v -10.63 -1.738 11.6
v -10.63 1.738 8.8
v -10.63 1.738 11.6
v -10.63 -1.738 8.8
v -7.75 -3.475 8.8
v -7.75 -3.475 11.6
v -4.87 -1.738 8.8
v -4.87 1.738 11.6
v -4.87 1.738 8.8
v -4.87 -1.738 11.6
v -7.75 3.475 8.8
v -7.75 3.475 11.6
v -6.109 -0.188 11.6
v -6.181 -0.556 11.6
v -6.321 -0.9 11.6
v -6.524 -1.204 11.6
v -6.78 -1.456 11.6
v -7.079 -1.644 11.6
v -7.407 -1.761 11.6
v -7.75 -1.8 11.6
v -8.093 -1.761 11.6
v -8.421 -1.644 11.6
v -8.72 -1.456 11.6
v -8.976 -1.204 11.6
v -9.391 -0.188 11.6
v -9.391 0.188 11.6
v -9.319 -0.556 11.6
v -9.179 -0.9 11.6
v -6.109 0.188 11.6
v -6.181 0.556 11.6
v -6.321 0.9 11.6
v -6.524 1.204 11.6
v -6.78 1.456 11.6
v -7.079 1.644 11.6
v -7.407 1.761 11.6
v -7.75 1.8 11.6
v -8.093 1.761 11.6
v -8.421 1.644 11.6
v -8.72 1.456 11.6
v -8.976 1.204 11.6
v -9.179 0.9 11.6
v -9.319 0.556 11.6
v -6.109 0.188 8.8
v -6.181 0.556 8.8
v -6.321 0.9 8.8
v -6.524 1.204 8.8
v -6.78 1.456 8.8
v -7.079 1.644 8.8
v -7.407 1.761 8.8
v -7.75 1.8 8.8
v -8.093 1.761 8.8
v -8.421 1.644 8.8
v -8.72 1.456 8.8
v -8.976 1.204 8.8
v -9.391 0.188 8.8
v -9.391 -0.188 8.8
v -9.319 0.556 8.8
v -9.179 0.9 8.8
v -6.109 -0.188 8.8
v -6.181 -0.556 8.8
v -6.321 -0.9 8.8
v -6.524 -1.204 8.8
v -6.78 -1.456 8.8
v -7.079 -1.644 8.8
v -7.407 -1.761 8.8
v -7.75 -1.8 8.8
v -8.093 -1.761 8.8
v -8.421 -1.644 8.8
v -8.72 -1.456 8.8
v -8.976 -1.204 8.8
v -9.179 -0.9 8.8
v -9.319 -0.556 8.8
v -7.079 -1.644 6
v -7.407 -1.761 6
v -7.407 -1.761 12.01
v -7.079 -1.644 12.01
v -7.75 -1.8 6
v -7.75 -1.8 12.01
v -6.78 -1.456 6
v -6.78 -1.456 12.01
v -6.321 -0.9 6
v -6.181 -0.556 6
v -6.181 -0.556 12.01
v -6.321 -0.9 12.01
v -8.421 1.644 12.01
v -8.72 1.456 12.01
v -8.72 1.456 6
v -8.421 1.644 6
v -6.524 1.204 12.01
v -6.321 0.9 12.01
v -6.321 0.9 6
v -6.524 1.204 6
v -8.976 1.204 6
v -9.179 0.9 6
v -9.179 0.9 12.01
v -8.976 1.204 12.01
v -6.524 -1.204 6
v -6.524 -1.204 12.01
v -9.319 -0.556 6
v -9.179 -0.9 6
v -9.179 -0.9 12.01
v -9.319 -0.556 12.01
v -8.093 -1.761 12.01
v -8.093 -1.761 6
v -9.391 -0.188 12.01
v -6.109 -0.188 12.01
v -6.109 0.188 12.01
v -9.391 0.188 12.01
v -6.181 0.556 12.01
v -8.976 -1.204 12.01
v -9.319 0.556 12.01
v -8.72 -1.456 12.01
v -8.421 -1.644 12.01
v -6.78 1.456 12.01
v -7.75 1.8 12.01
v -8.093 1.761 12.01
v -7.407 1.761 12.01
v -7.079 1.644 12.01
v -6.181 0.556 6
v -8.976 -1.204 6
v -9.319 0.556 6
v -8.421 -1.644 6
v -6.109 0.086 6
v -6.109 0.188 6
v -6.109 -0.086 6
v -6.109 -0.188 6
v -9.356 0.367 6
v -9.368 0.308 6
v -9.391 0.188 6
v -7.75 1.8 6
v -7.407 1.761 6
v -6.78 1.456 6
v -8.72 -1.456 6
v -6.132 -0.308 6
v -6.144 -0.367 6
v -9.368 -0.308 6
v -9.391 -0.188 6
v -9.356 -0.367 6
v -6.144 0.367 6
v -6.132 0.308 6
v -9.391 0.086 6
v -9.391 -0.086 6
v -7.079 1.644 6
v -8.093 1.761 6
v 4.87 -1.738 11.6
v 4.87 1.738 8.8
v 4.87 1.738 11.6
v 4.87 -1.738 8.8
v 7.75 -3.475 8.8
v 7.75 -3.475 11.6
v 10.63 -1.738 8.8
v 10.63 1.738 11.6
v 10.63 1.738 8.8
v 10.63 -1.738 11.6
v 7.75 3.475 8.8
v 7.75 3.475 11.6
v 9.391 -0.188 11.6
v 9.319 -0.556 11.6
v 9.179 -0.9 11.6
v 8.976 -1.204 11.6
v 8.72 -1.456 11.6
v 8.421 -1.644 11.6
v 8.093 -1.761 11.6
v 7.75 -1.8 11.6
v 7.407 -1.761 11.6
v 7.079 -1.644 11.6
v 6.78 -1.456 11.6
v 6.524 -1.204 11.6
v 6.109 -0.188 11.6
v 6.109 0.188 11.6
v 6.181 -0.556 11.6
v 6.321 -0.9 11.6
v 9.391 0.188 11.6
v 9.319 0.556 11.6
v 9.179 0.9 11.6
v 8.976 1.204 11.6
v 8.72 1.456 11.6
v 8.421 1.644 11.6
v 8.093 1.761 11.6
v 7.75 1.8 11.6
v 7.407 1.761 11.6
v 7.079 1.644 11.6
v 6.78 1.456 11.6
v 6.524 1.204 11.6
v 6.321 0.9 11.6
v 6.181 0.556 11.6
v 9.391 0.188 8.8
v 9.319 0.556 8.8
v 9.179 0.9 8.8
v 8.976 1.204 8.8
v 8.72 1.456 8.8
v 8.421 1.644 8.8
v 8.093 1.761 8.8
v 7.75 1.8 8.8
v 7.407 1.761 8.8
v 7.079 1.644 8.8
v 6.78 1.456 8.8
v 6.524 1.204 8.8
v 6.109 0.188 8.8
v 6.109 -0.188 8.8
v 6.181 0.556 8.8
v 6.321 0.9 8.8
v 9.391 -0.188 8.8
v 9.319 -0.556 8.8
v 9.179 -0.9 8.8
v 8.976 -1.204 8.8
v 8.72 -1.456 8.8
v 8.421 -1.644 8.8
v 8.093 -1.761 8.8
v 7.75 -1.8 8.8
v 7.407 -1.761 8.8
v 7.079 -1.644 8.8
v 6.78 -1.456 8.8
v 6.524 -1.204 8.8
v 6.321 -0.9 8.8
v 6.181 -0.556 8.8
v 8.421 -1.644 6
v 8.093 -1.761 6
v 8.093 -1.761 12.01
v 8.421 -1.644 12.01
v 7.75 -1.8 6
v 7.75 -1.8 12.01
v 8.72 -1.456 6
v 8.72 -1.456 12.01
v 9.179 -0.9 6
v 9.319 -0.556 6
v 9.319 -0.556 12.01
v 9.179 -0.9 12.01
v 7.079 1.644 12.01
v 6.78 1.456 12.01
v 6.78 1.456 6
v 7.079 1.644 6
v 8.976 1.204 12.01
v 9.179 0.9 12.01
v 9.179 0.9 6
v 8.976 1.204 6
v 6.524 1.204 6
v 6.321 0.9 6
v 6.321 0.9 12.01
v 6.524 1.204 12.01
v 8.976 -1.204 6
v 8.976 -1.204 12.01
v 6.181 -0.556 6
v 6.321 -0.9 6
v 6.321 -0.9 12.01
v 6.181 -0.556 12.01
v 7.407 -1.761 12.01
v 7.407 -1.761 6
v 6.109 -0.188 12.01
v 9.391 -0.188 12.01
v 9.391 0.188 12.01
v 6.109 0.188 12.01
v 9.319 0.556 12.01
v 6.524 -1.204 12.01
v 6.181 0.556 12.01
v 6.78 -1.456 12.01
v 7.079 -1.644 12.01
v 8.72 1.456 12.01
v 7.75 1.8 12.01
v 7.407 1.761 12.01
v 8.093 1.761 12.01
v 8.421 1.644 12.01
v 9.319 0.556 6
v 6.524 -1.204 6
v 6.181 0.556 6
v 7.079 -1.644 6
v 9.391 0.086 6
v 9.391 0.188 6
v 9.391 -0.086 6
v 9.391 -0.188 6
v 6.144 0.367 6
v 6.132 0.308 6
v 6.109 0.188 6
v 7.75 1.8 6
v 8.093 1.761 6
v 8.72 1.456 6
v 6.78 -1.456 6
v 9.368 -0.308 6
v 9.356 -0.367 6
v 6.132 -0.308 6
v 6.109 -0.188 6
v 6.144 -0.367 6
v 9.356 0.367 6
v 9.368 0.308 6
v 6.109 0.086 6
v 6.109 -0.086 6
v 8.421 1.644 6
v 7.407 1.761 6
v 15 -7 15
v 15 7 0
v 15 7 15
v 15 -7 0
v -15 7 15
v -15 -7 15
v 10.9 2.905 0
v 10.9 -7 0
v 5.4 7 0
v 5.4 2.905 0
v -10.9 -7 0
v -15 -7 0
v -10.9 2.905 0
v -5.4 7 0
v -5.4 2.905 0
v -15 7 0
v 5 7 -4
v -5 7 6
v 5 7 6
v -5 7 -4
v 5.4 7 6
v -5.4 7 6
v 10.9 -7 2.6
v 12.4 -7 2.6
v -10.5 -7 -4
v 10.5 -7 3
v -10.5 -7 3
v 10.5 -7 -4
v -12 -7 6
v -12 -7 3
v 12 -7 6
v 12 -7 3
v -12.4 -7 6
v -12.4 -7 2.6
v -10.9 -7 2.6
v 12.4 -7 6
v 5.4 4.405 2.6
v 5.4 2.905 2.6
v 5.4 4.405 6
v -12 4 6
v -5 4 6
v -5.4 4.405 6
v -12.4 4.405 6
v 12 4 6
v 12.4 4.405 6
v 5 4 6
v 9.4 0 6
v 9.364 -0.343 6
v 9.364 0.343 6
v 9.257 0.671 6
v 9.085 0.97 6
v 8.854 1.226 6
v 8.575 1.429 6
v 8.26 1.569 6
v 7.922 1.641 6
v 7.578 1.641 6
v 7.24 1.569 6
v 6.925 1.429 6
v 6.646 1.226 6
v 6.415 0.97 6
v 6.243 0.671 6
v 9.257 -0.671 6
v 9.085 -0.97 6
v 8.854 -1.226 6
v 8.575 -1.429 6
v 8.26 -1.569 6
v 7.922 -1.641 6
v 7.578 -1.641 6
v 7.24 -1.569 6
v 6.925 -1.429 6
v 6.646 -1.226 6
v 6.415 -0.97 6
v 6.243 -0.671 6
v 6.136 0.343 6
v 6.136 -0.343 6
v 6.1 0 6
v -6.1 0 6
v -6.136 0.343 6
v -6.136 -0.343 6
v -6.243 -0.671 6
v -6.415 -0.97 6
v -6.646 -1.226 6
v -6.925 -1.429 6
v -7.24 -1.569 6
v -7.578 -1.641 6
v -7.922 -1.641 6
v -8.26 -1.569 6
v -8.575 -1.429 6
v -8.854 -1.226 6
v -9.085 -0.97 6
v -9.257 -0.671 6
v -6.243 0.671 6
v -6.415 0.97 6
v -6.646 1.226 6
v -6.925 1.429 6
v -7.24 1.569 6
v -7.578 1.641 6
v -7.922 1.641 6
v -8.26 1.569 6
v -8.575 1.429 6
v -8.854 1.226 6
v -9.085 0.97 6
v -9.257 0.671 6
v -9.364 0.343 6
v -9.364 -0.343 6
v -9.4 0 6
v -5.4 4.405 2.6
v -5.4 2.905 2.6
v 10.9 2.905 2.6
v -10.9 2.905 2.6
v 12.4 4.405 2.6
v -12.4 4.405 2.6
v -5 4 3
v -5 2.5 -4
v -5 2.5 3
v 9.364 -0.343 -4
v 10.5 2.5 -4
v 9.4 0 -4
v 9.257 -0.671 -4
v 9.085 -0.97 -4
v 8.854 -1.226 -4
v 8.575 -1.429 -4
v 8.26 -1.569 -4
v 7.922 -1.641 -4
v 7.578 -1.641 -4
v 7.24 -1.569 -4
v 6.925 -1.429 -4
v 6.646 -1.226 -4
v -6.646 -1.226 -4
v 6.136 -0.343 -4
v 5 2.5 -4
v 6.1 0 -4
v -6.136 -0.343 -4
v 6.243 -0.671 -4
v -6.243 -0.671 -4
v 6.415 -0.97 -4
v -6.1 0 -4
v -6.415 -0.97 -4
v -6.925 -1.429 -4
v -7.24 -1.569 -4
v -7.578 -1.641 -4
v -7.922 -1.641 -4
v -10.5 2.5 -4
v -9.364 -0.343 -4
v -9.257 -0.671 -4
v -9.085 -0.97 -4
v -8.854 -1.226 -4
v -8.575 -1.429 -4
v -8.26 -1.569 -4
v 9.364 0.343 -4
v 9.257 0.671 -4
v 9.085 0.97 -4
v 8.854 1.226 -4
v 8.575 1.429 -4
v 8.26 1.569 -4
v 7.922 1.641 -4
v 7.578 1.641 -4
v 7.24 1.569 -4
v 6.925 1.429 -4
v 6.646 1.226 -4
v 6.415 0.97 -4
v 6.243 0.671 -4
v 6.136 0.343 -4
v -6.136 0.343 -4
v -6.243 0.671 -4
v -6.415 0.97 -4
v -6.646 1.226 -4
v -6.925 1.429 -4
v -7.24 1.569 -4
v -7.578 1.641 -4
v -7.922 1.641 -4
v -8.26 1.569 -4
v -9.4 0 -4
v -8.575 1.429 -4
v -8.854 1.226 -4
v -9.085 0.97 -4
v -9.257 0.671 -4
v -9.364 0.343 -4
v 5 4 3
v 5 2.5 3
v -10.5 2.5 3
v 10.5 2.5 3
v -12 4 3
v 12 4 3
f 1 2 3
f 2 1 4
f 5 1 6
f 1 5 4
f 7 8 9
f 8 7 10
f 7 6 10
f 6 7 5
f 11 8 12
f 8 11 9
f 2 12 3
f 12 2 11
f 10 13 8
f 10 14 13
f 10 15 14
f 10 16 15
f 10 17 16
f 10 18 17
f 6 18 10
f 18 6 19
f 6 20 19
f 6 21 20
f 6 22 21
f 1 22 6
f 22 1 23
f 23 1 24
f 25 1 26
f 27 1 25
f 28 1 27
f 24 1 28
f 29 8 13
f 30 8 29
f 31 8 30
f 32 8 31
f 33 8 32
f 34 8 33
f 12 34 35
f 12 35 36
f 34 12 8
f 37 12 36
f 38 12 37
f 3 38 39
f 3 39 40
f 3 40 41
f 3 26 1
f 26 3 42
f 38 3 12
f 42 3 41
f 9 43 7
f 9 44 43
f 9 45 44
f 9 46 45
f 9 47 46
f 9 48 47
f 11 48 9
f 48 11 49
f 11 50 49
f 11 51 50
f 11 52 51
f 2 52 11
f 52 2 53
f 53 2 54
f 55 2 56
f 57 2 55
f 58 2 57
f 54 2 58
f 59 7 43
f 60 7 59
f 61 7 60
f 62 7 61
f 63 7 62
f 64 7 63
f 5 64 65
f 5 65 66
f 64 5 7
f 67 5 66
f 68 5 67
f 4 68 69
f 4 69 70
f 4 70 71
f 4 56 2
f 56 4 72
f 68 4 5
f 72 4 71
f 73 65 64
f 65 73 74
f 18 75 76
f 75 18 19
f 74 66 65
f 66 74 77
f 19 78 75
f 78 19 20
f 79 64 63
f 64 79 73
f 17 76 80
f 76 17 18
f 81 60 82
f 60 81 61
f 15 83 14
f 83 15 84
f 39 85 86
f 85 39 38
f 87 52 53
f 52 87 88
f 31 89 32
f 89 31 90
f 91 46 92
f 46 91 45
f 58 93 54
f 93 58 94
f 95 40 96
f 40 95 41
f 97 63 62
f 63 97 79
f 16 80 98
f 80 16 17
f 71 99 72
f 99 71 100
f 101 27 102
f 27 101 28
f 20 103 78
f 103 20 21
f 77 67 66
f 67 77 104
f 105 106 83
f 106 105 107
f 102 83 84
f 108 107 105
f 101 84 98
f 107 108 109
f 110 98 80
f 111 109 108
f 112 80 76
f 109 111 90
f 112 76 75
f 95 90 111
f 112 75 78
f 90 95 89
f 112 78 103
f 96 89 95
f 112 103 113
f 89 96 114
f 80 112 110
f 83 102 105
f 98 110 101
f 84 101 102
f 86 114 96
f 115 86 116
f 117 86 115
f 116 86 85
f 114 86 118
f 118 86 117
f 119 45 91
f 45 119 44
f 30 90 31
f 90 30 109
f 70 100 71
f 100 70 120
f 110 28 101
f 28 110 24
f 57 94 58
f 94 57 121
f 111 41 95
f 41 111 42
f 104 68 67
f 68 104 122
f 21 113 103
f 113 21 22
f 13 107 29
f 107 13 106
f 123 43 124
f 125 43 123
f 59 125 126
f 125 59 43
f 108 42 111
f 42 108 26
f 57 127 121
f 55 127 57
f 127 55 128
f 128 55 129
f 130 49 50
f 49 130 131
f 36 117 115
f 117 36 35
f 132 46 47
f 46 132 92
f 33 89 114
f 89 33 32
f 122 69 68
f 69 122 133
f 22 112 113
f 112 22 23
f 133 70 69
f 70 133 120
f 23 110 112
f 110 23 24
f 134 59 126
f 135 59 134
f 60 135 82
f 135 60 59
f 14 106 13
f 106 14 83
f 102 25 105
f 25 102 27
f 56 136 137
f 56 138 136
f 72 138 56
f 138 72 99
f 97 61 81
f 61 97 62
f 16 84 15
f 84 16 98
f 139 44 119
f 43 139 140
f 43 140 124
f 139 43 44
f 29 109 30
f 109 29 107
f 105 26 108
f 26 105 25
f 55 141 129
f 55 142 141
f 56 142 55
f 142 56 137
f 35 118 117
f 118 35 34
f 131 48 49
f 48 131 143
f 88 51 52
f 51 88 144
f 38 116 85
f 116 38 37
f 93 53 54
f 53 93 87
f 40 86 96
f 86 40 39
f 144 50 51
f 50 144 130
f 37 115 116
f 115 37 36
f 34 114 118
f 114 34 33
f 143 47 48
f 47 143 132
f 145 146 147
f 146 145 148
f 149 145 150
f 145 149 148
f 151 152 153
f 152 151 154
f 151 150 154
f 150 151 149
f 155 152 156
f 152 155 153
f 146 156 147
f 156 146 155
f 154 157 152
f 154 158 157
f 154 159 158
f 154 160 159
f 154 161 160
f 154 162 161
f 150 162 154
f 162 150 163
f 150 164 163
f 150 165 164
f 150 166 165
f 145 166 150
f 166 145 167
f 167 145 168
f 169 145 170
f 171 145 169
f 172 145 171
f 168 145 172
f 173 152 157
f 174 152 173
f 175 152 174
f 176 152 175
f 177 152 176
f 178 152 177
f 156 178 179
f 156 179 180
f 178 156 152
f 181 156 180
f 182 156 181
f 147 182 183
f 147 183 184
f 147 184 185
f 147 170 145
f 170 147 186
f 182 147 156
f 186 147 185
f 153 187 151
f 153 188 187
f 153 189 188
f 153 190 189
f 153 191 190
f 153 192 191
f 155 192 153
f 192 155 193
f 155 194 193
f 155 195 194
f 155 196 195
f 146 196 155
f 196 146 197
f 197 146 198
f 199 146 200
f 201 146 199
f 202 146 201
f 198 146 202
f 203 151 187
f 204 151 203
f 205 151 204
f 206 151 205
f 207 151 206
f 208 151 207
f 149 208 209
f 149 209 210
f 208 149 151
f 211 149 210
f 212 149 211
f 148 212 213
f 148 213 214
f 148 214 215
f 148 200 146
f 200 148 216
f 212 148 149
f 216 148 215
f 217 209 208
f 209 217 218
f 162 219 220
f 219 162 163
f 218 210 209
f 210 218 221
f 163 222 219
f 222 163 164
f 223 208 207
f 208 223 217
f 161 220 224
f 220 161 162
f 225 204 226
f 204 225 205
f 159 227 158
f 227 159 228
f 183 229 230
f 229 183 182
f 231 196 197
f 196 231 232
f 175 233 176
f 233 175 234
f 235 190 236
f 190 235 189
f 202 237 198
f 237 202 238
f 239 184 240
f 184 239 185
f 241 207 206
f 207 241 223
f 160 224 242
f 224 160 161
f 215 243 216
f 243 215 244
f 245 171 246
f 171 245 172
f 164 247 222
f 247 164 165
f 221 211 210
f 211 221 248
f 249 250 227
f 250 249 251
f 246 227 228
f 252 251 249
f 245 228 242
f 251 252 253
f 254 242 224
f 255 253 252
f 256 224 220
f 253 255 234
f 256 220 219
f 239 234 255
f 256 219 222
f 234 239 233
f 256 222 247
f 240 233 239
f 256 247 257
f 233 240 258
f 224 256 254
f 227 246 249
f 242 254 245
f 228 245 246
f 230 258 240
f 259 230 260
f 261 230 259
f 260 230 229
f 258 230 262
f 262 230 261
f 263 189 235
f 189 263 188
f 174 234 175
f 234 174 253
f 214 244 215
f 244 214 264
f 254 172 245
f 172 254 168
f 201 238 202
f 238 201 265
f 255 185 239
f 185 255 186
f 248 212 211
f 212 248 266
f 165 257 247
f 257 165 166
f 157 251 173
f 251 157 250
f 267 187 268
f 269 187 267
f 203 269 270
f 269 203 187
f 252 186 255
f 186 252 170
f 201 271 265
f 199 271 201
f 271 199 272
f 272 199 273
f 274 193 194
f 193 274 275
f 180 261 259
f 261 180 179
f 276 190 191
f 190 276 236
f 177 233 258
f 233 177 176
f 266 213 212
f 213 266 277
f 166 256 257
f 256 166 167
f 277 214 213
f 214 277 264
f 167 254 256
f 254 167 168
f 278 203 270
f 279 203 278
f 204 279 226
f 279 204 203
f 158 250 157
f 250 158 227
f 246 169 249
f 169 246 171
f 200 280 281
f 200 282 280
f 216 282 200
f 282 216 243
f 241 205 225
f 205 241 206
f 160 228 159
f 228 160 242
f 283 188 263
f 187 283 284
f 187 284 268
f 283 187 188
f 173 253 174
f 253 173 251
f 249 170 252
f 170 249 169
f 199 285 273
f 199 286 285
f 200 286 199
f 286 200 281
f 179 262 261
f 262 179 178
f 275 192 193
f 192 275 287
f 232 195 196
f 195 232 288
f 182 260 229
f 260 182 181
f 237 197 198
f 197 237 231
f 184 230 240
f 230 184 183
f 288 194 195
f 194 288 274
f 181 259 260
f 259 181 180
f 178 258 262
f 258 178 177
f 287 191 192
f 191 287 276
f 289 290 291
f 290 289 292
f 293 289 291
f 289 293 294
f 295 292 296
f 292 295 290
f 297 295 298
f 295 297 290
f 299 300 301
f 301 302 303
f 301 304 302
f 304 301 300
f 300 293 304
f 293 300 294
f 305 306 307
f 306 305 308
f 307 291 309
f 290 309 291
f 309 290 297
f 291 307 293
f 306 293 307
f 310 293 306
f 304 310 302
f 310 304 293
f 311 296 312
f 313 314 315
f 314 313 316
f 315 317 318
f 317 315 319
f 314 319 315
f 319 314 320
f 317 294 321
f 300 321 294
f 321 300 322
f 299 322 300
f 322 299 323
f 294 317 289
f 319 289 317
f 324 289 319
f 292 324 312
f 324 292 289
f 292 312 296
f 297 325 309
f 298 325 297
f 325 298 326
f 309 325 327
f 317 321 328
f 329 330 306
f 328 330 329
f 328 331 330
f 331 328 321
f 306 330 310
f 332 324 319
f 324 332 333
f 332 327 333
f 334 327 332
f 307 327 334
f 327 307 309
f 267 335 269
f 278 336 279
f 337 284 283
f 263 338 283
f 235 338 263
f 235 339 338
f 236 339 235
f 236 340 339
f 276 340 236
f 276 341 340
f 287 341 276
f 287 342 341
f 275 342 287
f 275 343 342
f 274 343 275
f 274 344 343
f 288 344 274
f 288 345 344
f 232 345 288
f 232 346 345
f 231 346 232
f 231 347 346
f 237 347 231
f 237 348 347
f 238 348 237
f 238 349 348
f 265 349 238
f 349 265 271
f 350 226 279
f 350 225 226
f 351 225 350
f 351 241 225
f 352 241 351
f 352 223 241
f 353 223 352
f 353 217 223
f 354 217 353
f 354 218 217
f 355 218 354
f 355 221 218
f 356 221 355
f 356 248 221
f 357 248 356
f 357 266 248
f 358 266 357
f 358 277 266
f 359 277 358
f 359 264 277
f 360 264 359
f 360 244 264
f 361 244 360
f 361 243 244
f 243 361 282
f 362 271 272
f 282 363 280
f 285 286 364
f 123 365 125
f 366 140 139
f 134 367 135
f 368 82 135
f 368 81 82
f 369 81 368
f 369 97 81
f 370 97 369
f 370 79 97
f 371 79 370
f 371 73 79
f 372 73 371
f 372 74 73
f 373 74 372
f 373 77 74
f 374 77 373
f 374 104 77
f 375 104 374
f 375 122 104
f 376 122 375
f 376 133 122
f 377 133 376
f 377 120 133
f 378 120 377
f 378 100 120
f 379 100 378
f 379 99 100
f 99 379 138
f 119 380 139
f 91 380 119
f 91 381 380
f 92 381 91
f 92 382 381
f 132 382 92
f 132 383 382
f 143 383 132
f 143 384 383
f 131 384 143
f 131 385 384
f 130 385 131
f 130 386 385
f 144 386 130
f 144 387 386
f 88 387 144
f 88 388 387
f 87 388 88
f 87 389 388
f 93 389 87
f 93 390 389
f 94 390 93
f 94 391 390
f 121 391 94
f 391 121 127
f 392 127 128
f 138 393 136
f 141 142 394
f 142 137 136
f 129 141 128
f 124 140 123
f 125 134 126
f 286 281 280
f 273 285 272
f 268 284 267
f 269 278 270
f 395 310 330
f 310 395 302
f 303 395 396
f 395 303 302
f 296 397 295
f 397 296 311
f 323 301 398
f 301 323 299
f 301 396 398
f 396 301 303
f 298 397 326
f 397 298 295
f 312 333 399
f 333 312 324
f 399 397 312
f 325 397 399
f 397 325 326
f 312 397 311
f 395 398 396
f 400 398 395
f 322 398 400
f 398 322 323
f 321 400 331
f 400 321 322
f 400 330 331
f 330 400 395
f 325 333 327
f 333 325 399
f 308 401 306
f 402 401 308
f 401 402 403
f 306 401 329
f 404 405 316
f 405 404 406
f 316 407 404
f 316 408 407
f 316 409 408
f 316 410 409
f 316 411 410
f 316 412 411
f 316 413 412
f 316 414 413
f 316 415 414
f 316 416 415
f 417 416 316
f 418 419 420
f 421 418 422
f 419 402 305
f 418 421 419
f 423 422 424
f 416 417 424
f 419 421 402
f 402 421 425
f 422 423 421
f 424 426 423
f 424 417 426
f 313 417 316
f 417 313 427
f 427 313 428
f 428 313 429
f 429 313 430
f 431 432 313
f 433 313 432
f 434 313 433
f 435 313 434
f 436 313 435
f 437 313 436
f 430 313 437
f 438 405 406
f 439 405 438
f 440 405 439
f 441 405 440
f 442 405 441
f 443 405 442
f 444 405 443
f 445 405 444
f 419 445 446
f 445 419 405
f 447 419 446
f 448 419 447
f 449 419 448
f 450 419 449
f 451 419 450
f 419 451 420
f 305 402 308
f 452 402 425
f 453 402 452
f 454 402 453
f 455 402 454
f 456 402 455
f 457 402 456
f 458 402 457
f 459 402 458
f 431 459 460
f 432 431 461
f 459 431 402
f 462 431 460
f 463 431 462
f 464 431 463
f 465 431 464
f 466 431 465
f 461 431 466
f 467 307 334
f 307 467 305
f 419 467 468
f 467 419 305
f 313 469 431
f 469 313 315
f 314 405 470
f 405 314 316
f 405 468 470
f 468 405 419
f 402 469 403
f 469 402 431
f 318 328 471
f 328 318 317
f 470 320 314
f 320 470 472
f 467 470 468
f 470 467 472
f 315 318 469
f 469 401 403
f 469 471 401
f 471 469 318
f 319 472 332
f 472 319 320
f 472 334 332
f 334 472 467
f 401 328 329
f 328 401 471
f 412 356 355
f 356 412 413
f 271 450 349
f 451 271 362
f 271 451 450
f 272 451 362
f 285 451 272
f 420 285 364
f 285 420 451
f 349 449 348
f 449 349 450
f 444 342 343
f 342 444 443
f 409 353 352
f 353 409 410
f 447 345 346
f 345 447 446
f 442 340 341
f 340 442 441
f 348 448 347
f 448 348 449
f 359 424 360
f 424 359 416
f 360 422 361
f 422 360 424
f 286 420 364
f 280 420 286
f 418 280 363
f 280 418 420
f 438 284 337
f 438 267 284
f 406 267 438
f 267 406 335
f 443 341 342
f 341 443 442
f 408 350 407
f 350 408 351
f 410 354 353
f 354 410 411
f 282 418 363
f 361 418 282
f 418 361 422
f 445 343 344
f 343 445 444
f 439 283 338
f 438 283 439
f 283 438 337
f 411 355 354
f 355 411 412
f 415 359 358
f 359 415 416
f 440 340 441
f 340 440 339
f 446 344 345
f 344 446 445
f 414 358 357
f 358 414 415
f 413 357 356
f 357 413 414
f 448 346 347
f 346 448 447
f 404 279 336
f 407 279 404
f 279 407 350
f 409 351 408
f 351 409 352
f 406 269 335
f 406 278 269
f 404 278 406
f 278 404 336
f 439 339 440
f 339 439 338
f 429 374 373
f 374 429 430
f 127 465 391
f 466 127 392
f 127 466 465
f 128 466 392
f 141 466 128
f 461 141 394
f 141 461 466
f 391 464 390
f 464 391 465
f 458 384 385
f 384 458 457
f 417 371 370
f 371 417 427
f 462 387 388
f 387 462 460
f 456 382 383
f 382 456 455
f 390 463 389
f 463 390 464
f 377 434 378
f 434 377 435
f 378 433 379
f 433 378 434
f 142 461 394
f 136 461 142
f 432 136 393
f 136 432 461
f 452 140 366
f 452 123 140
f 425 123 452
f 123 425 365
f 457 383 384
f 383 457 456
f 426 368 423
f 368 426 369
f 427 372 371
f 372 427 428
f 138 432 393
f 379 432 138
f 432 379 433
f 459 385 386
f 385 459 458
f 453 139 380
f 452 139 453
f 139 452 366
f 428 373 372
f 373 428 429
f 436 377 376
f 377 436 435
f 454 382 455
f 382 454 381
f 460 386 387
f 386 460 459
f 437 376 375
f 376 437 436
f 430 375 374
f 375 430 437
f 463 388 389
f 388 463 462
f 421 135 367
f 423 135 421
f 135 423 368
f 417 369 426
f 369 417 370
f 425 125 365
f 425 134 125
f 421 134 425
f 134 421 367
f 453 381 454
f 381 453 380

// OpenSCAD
include <./variables.scad>
include <BOSL2/std.scad>

module bottom_lid() {
  cuboid([ base_size.x, base_size.y, wall_thickness ], anchor = TOP);

  x = base_wall_x - wall_thickness / 2;
  right(x) bottom_lid_connector(anchor = BOTTOM + RIGHT);
  left(x) bottom_lid_connector(anchor = BOTTOM + LEFT);
}

module bottom_lid_connector(anchor = CENTER, spin = 0, orient = UP) {
  attachable(anchor, spin, orient, size = bottom_lid_connector_size) {
    down(bottom_lid_connector_size.z / 2) rotate([ 0, -90, 0 ]) linear_extrude(
        bottom_lid_connector_size.x, center = true) bottom_lid_connector_2d();
    children();
  }
}
module bottom_lid_connector_2d() {
  r = bottom_lid_connector_size.y / 2;
  size_2d = [ bottom_lid_connector_size.z, bottom_lid_connector_size.y ];

  difference() {
    rect(size_2d, rounding = [ r, 0, 0, r ], anchor = LEFT);
    right(bottom_connector_hole_distance)
        circle(d = bottom_connector_lid_hole_diameter);
  }
}
